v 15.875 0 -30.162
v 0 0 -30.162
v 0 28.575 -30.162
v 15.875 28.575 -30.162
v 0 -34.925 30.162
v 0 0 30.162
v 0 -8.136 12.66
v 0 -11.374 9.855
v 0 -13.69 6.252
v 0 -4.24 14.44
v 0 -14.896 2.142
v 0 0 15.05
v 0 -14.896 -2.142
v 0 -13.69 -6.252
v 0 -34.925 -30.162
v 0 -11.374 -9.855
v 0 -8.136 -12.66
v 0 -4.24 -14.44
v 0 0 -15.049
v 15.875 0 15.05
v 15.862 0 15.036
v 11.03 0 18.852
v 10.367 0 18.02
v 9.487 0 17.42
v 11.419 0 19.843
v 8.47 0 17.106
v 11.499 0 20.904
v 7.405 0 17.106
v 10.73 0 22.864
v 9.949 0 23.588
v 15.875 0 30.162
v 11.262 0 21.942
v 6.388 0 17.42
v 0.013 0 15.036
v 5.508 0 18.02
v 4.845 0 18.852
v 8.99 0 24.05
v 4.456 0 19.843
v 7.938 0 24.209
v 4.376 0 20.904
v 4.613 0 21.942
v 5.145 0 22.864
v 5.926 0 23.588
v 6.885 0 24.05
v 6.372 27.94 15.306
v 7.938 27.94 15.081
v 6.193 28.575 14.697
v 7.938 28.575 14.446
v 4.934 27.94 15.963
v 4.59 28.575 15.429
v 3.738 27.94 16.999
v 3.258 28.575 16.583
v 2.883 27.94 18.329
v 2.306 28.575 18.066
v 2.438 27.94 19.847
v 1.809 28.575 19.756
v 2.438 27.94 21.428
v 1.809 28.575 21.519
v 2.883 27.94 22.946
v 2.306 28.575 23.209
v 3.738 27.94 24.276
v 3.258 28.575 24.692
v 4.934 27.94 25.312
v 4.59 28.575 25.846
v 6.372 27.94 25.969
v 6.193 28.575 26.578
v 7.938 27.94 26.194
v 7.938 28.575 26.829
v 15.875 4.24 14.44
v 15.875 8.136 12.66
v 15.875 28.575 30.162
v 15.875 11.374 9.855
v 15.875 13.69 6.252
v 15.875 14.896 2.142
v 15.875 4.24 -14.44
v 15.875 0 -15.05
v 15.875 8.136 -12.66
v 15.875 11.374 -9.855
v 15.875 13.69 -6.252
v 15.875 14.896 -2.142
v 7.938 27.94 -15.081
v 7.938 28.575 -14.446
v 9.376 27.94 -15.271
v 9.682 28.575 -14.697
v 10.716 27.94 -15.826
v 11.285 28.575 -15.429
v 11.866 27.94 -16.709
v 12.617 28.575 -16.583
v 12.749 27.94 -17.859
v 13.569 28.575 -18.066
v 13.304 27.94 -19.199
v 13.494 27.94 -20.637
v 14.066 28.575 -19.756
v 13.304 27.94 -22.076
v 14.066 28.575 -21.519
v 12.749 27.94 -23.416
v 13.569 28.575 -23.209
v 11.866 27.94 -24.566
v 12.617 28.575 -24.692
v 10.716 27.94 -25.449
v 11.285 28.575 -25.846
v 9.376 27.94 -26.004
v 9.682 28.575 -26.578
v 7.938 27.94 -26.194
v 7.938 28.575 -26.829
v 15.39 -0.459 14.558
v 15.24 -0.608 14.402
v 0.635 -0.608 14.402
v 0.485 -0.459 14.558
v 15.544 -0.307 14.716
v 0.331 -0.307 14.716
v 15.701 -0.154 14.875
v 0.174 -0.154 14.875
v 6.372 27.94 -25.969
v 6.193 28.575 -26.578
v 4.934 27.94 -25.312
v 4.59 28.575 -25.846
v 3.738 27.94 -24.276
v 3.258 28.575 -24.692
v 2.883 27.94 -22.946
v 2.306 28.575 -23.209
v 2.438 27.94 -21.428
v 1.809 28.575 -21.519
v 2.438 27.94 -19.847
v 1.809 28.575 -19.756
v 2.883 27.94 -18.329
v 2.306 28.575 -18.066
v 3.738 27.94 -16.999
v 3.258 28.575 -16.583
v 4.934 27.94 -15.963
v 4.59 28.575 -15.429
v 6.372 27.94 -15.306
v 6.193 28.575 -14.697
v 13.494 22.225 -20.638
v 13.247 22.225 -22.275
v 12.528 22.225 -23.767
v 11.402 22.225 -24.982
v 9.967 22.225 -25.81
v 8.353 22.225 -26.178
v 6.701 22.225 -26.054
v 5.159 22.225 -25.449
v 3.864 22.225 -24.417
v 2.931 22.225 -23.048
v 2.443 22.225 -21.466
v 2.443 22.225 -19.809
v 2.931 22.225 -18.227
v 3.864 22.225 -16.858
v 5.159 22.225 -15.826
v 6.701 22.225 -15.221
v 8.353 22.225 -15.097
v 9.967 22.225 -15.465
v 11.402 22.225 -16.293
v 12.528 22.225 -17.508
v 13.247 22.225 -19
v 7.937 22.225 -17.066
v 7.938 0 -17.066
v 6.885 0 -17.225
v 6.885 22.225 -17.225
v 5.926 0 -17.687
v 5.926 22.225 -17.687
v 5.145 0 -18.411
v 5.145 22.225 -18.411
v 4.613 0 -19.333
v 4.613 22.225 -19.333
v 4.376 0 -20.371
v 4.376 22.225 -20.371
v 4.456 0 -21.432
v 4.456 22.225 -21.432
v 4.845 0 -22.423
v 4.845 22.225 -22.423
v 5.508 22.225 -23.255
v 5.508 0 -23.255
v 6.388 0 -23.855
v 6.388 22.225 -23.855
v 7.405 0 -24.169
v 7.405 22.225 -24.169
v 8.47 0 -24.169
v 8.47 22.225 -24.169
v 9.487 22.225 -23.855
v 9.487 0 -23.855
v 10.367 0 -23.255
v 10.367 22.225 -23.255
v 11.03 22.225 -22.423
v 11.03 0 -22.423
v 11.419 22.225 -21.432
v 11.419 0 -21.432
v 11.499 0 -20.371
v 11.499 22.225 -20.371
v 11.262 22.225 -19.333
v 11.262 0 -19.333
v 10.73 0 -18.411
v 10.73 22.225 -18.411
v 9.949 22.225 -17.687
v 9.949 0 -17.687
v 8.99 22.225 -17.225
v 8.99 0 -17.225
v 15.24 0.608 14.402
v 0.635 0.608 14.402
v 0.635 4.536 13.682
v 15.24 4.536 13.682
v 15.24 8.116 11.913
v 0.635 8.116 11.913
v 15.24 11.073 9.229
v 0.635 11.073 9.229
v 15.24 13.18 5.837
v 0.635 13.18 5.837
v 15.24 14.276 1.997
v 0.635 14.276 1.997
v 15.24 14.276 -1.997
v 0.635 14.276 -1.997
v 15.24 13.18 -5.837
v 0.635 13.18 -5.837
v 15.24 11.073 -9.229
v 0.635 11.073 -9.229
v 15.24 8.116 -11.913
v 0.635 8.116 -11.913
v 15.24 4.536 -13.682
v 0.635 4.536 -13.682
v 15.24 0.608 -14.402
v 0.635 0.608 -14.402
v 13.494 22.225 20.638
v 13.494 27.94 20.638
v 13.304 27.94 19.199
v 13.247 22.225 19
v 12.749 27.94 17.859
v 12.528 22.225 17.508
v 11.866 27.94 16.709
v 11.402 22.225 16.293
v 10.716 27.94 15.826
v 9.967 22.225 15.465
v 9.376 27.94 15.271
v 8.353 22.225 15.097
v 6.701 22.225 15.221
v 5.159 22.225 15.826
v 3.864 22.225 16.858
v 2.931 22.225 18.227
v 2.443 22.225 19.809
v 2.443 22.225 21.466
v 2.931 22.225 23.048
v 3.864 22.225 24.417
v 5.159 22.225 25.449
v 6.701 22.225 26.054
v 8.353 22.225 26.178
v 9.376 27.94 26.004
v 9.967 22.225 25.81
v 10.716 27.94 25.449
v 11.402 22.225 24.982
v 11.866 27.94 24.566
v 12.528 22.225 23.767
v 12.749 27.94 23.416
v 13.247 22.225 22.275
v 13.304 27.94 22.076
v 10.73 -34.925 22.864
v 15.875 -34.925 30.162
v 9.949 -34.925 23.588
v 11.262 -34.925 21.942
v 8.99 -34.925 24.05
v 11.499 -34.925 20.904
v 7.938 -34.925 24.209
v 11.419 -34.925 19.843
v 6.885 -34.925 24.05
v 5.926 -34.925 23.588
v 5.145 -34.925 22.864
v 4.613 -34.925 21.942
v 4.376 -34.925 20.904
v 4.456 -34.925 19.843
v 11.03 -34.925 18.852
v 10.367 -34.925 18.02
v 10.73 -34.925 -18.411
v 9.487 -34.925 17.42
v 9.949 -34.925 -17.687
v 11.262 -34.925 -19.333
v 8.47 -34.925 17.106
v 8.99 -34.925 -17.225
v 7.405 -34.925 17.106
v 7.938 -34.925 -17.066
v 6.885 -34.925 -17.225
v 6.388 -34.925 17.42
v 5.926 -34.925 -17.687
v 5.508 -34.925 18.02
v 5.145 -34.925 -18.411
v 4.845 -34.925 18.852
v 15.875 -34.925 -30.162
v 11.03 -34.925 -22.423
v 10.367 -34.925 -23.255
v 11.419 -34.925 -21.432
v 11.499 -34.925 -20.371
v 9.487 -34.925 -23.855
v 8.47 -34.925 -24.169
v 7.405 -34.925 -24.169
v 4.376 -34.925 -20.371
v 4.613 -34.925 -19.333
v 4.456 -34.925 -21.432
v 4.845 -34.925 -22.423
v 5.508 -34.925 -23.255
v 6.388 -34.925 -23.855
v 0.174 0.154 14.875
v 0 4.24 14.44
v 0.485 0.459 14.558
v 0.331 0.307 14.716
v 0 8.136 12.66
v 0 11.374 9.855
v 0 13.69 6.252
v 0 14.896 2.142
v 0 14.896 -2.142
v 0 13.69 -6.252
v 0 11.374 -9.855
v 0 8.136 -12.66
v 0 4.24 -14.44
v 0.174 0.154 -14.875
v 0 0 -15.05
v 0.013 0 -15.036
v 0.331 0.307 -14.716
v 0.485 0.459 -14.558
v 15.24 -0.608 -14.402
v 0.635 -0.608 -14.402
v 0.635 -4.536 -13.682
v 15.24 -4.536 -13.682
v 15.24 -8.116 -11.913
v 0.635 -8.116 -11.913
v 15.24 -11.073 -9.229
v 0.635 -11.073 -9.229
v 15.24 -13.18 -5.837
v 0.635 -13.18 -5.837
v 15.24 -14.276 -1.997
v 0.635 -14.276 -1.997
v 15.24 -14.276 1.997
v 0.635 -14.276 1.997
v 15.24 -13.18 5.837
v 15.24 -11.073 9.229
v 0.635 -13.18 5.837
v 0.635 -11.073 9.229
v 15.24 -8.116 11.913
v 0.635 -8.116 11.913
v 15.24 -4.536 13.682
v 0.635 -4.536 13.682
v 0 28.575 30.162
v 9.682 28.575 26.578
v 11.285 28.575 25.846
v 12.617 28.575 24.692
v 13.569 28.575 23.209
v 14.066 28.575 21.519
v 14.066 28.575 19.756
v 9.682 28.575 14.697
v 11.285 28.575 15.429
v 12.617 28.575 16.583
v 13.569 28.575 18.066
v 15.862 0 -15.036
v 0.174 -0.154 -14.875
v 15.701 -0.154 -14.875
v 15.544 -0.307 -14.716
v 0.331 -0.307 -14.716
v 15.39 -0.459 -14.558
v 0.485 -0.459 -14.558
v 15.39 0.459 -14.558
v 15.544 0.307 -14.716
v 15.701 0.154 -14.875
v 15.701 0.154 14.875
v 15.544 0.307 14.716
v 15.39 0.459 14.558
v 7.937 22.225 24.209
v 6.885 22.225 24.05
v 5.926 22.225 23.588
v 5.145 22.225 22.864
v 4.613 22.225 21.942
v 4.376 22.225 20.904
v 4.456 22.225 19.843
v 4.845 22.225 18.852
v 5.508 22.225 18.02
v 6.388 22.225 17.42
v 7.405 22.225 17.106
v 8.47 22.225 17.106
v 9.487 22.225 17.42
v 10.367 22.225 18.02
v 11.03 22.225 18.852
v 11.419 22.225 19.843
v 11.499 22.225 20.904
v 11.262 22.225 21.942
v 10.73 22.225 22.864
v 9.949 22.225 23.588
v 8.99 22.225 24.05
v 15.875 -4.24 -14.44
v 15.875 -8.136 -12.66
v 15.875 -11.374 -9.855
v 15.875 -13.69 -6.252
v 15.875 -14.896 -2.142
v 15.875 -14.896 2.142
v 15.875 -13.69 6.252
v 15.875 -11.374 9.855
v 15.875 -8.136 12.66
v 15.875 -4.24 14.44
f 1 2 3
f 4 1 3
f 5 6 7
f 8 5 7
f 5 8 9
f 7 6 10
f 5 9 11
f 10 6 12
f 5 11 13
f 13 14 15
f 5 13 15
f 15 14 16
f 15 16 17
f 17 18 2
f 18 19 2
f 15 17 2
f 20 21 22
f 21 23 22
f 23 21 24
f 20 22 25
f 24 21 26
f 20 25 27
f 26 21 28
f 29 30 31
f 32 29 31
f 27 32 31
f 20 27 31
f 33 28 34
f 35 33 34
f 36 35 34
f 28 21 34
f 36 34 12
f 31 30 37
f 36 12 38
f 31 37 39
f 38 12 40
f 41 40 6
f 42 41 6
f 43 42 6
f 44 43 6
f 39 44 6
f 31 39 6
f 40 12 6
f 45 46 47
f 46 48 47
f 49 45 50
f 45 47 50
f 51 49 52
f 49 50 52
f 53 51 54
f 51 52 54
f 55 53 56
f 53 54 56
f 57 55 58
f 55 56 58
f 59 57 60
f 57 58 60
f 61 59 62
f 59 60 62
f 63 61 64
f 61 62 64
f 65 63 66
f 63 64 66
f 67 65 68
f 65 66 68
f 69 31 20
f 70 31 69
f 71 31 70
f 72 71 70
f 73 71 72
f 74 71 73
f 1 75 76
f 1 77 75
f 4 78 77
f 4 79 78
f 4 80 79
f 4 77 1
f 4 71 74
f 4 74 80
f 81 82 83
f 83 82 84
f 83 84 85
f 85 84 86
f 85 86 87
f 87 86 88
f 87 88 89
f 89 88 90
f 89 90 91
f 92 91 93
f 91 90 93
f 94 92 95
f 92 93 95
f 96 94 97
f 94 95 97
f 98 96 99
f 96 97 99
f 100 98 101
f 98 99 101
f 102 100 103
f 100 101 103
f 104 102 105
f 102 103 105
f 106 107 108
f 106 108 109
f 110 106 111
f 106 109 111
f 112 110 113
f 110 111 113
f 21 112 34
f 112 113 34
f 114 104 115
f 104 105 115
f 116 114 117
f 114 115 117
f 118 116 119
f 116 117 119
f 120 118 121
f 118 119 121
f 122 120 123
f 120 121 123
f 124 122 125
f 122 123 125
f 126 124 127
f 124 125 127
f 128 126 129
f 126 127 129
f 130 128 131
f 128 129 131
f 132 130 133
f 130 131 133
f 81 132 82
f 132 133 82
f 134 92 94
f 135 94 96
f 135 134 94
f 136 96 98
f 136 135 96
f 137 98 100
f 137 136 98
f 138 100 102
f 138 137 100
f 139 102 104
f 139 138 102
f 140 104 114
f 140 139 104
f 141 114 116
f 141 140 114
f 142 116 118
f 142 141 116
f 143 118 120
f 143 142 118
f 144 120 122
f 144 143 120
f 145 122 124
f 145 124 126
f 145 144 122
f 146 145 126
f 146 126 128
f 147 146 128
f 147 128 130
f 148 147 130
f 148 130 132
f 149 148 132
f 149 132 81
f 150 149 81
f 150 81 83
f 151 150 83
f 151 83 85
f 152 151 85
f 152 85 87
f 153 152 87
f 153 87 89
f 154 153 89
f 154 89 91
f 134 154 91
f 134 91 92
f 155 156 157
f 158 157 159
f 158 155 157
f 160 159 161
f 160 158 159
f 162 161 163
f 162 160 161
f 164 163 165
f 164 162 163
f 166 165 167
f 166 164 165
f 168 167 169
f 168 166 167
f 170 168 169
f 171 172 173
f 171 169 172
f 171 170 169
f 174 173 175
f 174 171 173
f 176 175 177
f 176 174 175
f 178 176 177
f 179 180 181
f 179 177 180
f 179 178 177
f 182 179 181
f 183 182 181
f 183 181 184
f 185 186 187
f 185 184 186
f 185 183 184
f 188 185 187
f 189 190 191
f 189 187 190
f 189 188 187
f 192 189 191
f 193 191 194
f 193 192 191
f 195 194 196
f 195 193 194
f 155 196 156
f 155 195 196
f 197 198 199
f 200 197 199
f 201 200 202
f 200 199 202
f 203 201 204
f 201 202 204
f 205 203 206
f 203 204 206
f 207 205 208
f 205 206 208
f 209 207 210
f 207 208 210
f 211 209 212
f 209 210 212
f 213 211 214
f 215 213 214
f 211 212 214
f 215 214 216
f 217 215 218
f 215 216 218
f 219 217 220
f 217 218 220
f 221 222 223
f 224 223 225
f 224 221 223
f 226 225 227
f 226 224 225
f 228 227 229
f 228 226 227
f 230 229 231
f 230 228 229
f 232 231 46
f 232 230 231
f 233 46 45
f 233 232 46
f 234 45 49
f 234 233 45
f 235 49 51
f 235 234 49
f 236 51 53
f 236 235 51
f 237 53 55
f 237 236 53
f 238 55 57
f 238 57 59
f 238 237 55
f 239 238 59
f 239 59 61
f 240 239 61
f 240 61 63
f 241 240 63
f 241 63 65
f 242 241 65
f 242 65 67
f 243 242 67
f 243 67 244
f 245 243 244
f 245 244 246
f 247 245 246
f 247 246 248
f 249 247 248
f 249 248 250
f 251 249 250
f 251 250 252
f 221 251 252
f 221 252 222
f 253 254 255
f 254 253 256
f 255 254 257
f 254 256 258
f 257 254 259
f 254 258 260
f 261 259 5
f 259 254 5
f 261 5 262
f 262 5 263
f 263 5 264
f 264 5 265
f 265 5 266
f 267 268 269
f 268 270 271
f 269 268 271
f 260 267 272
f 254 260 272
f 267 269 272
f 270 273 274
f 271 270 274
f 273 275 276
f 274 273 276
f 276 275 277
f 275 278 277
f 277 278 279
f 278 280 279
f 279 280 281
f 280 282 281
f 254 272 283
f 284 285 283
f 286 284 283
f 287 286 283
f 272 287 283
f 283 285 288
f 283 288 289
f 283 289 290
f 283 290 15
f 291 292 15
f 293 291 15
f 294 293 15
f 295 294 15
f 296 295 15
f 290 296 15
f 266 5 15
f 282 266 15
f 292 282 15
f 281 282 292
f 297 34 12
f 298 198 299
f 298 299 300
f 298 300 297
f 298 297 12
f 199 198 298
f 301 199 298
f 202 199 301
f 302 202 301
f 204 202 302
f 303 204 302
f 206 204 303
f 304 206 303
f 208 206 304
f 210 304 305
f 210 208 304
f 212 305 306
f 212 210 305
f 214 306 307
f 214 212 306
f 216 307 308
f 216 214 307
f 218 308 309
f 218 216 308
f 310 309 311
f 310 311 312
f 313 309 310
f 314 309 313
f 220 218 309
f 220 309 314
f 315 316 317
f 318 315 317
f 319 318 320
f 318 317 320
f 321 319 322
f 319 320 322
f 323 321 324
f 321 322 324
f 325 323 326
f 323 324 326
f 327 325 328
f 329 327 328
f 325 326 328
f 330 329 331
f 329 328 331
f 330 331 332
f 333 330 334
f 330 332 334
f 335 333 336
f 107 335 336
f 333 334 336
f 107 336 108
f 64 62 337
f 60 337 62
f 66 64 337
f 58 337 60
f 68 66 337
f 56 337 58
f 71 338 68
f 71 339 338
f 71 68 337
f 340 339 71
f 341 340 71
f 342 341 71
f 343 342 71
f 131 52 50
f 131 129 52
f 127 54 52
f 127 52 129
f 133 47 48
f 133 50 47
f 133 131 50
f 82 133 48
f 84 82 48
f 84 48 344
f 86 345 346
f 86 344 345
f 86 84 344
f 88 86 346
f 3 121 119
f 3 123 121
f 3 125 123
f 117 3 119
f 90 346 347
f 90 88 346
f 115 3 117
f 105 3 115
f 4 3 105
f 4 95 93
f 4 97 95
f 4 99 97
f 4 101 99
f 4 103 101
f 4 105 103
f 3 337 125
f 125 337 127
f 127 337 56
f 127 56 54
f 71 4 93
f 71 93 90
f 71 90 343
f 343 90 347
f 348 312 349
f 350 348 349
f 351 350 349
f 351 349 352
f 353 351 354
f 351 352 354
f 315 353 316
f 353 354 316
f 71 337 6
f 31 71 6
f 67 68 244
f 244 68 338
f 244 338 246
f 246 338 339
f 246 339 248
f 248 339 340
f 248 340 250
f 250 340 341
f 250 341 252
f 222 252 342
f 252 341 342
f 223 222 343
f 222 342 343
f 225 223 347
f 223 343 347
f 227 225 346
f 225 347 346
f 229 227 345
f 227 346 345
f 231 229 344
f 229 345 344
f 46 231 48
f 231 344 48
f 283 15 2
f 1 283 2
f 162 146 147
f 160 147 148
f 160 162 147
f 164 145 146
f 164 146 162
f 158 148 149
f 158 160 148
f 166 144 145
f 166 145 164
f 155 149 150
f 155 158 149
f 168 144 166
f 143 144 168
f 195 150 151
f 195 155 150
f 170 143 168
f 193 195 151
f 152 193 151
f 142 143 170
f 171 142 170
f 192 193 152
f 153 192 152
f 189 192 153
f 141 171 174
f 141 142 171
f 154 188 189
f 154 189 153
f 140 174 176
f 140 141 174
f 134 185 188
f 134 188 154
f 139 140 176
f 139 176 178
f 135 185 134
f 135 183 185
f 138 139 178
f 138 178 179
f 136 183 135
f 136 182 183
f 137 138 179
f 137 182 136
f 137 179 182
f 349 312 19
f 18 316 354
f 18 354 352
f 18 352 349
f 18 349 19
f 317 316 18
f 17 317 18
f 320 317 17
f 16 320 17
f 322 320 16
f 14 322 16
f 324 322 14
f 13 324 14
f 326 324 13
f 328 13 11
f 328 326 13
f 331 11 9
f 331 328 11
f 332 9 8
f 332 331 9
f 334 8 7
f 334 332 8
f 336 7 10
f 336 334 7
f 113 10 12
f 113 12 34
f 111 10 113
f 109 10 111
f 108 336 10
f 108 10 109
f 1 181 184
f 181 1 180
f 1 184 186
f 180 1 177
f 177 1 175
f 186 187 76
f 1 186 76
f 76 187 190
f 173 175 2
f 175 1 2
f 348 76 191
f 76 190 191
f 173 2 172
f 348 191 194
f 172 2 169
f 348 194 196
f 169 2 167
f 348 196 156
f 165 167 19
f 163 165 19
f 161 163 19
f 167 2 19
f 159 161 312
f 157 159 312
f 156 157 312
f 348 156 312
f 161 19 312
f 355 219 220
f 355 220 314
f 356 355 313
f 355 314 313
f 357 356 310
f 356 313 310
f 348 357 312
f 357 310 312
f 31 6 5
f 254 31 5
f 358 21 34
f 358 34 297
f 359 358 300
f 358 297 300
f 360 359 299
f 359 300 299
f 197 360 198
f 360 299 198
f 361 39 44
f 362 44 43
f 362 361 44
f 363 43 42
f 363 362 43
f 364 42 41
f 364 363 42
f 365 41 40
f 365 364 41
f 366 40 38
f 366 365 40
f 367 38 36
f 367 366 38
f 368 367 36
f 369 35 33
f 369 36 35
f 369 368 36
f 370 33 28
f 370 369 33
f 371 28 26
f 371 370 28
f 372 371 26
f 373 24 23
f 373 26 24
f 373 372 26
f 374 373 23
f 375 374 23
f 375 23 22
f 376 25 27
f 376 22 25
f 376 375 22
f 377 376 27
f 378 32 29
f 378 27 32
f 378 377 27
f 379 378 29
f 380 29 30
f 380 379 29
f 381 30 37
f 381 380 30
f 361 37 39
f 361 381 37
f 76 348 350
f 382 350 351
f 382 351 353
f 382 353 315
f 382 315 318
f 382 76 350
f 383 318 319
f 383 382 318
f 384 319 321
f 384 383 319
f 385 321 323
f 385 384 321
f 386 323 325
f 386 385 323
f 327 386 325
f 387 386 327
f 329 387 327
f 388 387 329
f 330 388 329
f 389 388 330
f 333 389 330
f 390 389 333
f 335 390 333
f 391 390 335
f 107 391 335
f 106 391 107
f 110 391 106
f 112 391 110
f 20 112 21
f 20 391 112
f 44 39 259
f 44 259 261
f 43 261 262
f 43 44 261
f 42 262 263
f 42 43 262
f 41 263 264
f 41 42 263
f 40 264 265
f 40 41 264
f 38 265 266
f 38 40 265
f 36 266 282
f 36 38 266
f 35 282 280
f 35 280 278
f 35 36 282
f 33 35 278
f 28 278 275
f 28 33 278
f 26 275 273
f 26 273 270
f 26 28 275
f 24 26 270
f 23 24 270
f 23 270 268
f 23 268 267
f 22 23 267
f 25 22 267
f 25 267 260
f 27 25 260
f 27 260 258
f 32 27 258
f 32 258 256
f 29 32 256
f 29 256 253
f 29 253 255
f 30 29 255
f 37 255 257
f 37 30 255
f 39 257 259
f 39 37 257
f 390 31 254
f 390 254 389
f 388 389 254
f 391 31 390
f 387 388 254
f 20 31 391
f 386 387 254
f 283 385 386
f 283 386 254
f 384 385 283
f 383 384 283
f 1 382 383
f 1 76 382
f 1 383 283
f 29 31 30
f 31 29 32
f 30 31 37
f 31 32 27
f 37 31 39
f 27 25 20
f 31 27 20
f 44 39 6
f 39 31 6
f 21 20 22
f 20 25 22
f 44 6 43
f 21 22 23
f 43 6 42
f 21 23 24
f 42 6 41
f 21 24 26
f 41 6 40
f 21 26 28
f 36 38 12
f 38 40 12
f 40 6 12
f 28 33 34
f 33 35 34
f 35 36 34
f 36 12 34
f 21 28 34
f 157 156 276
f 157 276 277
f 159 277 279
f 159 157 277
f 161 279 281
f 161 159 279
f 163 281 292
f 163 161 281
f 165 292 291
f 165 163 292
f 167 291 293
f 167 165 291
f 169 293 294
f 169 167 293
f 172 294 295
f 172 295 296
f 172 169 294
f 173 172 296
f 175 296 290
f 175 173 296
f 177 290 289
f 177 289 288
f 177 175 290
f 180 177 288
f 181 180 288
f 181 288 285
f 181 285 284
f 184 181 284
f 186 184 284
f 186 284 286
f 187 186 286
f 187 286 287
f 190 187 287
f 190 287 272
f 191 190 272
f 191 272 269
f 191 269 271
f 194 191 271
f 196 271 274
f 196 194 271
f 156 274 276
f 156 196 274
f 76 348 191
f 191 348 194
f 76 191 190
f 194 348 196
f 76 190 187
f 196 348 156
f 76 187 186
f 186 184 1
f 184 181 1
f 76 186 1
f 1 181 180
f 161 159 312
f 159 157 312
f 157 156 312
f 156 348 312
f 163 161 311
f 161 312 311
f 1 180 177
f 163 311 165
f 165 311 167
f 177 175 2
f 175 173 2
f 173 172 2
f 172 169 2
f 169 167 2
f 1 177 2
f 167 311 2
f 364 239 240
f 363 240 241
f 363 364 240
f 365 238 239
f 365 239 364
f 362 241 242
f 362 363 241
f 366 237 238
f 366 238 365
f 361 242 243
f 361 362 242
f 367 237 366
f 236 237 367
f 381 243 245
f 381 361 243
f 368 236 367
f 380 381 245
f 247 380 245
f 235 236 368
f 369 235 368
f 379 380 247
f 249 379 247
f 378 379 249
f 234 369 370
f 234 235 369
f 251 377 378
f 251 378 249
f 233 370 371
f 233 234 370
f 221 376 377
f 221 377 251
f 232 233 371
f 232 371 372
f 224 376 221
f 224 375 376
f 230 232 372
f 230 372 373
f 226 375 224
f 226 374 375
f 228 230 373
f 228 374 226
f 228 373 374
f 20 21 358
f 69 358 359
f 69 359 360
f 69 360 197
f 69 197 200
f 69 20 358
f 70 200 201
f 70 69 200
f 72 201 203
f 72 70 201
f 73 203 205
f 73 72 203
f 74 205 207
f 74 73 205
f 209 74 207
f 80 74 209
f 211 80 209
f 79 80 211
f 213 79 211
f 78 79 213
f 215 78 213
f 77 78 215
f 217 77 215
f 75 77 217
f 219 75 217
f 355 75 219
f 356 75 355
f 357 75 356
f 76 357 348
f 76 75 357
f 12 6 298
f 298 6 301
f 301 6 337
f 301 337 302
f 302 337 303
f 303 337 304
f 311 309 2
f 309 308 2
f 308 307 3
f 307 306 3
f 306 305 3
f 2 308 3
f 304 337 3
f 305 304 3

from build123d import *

# Parameters (mm, degrees)
BOSS_EXTRUDE1_DEPTH                           = 15.875
BOSS_EXTRUDE2_DEPTH                           = 15.875
CBORE_FOR_1_4_SOCKET_HEAD_CAP_SCREW1_AT_COUNT = 2
CBORE_FOR_1_4_SOCKET_HEAD_CAP_SCREW1_AT_PITCH = 41.275
MOVE_FACE1_BY                                 = 0.127
MOVE_FACE1_2_BY                               = 0.127
MOVE_START                                    = 28.575
MOVE_FACE2_OUTLINE_W                          = 15.875
MOVE_FACE2_OUTLINE_H                          = 60.325
MOVE_FACE2_OUTLINE_R                          = 5.55625
MOVE_FACE2_DEPTH                              = 6.35
MOVE_START_2                                  = 22.225
MOVE_FACE2_2_OUTLINE_R                        = 5.55625
MOVE_FACE2_2_OUTLINE_R_2                      = 3.57124
MOVE_FACE2_2_DEPTH                            = 6.35


with BuildPart() as part:
    # Sketch1 → Boss-Extrude1 (new body)
    with BuildSketch(Plane(origin=(0, 0, 0), x_dir=(0, 0, -1), z_dir=(1, 0, 0))):
        with BuildLine():
            Line((30.1625, 0), (14.2875, 0))
            ThreePointArc((14.2875, 0), (0, -14.2875), (-14.2875, 0))
            Line((-14.2875, 0), (-30.1625, 0))
            Line((-30.1625, 0), (-30.1625, -34.925))
            Line((-30.1625, -34.925), (30.1625, -34.925))
            Line((30.1625, -34.925), (30.1625, 0))
        make_face()
    extrude(amount=BOSS_EXTRUDE1_DEPTH)


with BuildPart() as body_2:
    # Sketch1<3> → Boss-Extrude2 (new body)
    with BuildSketch(Plane(origin=(0, 0, 0), x_dir=(0, 0, -1), z_dir=(1, 0, 0))):
        with BuildLine():
            ThreePointArc((-14.2875, 0), (0, 14.2875), (14.2875, 0))
            Line((14.2875, 0), (30.1625, 0))
            Line((30.1625, 0), (30.1625, 34.925))
            Line((30.1625, 34.925), (-30.1625, 34.925))
            Line((-30.1625, 34.925), (-30.1625, 0))
            Line((-30.1625, 0), (-14.2875, 0))
        make_face()
    extrude(amount=BOSS_EXTRUDE2_DEPTH)


with BuildPart() as cbore_for_1_4_socket_head_cap_screw1_tool:
    # Sketch4 → CBORE for 1/4 Socket Head Cap Screw1 (revolve)
    with BuildSketch(Plane(origin=(7.9375, 34.925, 20.6375), x_dir=(0, 0, 1), z_dir=(1, 0, 0))):
        Polygon((0, 0), (0, 69.85), (3.57124, 69.85), (3.57124, 6.35), (5.55625, 6.35), (5.55625, 0.635), (6.19125, 0), align=None)
    cbore_for_1_4_socket_head_cap_screw1 = revolve(axis=Axis((7.9375, 41.275, 20.6375), (0, -1, 0)))


with BuildPart() as part_1:
    add(part.part)

    # CBORE for 1/4 Socket Head Cap Screw1: cut by cbore_for_1_4_socket_head_cap_screw1_tool
    add(cbore_for_1_4_socket_head_cap_screw1_tool.part, mode=Mode.SUBTRACT)


with BuildPart() as body_2_1:
    add(body_2.part)

    # CBORE for 1/4 Socket Head Cap Screw1: cut by cbore_for_1_4_socket_head_cap_screw1_tool
    add(cbore_for_1_4_socket_head_cap_screw1_tool.part, mode=Mode.SUBTRACT)


with BuildPart() as cbore_for_1_4_socket_head_cap_screw1_at_tool:
    # CBORE for 1/4 Socket Head Cap Screw1 at: CBORE for 1/4 Socket Head Cap Screw1 ×2
    with Locations(*[(0, 0, -i * CBORE_FOR_1_4_SOCKET_HEAD_CAP_SCREW1_AT_PITCH) for i in range(1, CBORE_FOR_1_4_SOCKET_HEAD_CAP_SCREW1_AT_COUNT)]):
        add(cbore_for_1_4_socket_head_cap_screw1)


with BuildPart() as part_2:
    add(part_1.part)

    # CBORE for 1/4 Socket Head Cap Screw1 at: cut by cbore_for_1_4_socket_head_cap_screw1_at_tool
    add(cbore_for_1_4_socket_head_cap_screw1_at_tool.part, mode=Mode.SUBTRACT)

    # Move Face1 2: a curved face moved inward by 0.127
    add(Solid.thicken(part_2.faces().sort_by_distance((7.9375, -14.2875, 0))[0], -MOVE_FACE1_2_BY), mode=Mode.SUBTRACT)

    # Chamfer2
    # the kernel refuses this chamfer: 0.635 mm, written as the material it takes off along each edge
    with BuildSketch(Plane(origin=(0, 0, 0), x_dir=(0, 0.1132288377802066, -0.9935689358544497), z_dir=(0, 0.9935689358544497, 0.1132288377802066))) as chamfer2_piece_1:
        with BuildLine():
            Line((15.067460512, 0.017960512), (14.396539488, -0.652960512))
            Line((14.396539488, -0.652960512), (14.383839488, -0.652960512))
            ThreePointArc((14.383839488, -0.652960512), (14.4018, -0.326480256), (14.4018, 0))
            Line((14.4018, 0), (14.4145, 0.0127))
            ThreePointArc((14.4145, 0.0127), (14.740980256, 0.0127), (15.067460512, 0.030660512))
            Line((15.067460512, 0.030660512), (15.067460512, 0.017960512))
        make_face()
    revolve(axis=Axis((0, 0, 0), (-1, 0, 0)), revolution_arc=193.002955297, mode=Mode.SUBTRACT)
    with BuildSketch(Plane(origin=(-1.600435701, 0, -14.4145), x_dir=(0, 0, -1), z_dir=(1, 0, 0))) as chamfer2_piece_2:
        with BuildLine():
            Line((0.639932919, 0.017577515), (-0.031172593, -0.625784266))
            Line((-0.031172593, -0.625784266), (-0.043861283, -0.625248401))
            ThreePointArc((-0.043861283, -0.625248401), (-0.016099091, -0.31288099), (-0.0127, 0))
            Line((-0.0127, 0), (0, 0.0127))
            ThreePointArc((0, 0.0127), (0.319966459, 0.0127), (0.639932919, 0.030277515))
            Line((0.639932919, 0.030277515), (0.639932919, 0.017577515))
        make_face()
    extrude(amount=19.075871403, mode=Mode.SUBTRACT)
    with BuildSketch(Plane(origin=(-1.600435701, 0, 14.4145), x_dir=(0, -0.999777333387341, -0.021101745067597762), z_dir=(1, 0, 0))) as chamfer2_piece_3:
        with BuildLine():
            Line((0.626302721, 0.017960512), (-0.031077302, -0.639419511))
            Line((-0.031077302, -0.639419511), (-0.043774474, -0.639151519))
            ThreePointArc((-0.043774474, -0.639151519), (-0.019449023, -0.319627221), (-0.012697172, 0.000267992))
            Line((-0.012697172, 0.000267992), (0.000267992, 0.012697172))
            ThreePointArc((0.000267992, 0.012697172), (0.313151041, 0.009493172), (0.626034729, 0.030657684))
            Line((0.626034729, 0.030657684), (0.626302721, 0.017960512))
        make_face()
    extrude(amount=19.075871403, mode=Mode.SUBTRACT)
    with BuildSketch(Plane(origin=(15.875, 0, 0), x_dir=(0, 0.11322883778020662, -0.9935689358544497), z_dir=(0, 0.9935689358544497, 0.11322883778020662))) as chamfer2_piece_4:
        with BuildLine():
            Line((14.396539488, 0.652960512), (15.067460512, -0.017960512))
            Line((15.067460512, -0.017960512), (15.067460512, -0.030660512))
            ThreePointArc((15.067460512, -0.030660512), (14.740980256, -0.0127), (14.4145, -0.0127))
            Line((14.4145, -0.0127), (14.4018, 0))
            ThreePointArc((14.4018, 0), (14.4018, 0.326480256), (14.383839488, 0.652960512))
            Line((14.383839488, 0.652960512), (14.396539488, 0.652960512))
        make_face()
    revolve(axis=Axis((15.875, 0, 0), (-1, 0, 0)), revolution_arc=193.002955297, mode=Mode.SUBTRACT)


with BuildPart() as body_2_2:
    add(body_2_1.part)

    # CBORE for 1/4 Socket Head Cap Screw1 at: cut by cbore_for_1_4_socket_head_cap_screw1_at_tool
    add(cbore_for_1_4_socket_head_cap_screw1_at_tool.part, mode=Mode.SUBTRACT)

    # Move Face1: a curved face moved inward by 0.127
    add(Solid.thicken(body_2_2.faces().sort_by_distance((7.9375, 14.2875, 0))[0], -MOVE_FACE1_BY), mode=Mode.SUBTRACT)

    # Move Face2: read off the stored shape, not the designer's step
    # Move Face2 outline → Move Face2 (cut)
    with BuildSketch(Plane(origin=(0, 0, 0), x_dir=(1, 0, 0), z_dir=(0, 1, 0)).offset(MOVE_START)):
        with Locations((7.9375, 0)):
            Rectangle(MOVE_FACE2_OUTLINE_W, MOVE_FACE2_OUTLINE_H)
        with Locations((7.9375, -20.6375)):
            Circle(MOVE_FACE2_OUTLINE_R, mode=Mode.SUBTRACT)
        with Locations((7.9375, 20.6375)):
            Circle(MOVE_FACE2_OUTLINE_R, mode=Mode.SUBTRACT)
    extrude(amount=MOVE_FACE2_DEPTH, mode=Mode.SUBTRACT)

    # Move Face2 2 outline → Move Face2 2 (cut)
    # profile 1 of 2: a face of its own
    with BuildSketch(Plane(origin=(0, 0, 0), x_dir=(1, 0, 0), z_dir=(0, 1, 0)).offset(MOVE_START_2)):
        with Locations((7.9375, 20.6375)):
            Circle(MOVE_FACE2_2_OUTLINE_R)
        with Locations((7.9375, 20.6375)):
            Circle(MOVE_FACE2_2_OUTLINE_R_2, mode=Mode.SUBTRACT)
    # profile 2 of 2: a face of its own
    with BuildSketch(Plane(origin=(0, 0, 0), x_dir=(1, 0, 0), z_dir=(0, 1, 0)).offset(MOVE_START_2)):
        with Locations((7.9375, -20.6375)):
            Circle(MOVE_FACE2_2_OUTLINE_R)
        with Locations((7.9375, -20.6375)):
            Circle(MOVE_FACE2_2_OUTLINE_R_2, mode=Mode.SUBTRACT)
    extrude(amount=MOVE_FACE2_2_DEPTH, mode=Mode.SUBTRACT)

    # Move Face2 3: loft between two sections, ruled curve by curve
    move_face2_3_from = [
        Edge.make_three_point_arc((7.9375, 27.94, -15.08125), (13.49375, 27.94, -20.6375), (7.9375, 27.94, -26.19375)),
        Edge.make_three_point_arc((7.9375, 27.94, -26.19375), (2.38125, 27.94, -20.6375), (7.9375, 27.94, -15.08125)),
    ]
    move_face2_3_to = [
        Edge.make_three_point_arc((7.9375, 28.575, -14.44625), (14.12875, 28.575, -20.6375), (7.9375, 28.575, -26.82875)),
        Edge.make_three_point_arc((7.9375, 28.575, -26.82875), (1.74625, 28.575, -20.6375), (7.9375, 28.575, -14.44625)),
    ]
    move_face2_3 = Solid(Shell([*[Face.make_surface_from_curves(move_face2_3_from[k], move_face2_3_to[k]) for k in range(2)], Face(Wire(move_face2_3_from)), Face(Wire(move_face2_3_to))]))
    add(move_face2_3, mode=Mode.SUBTRACT)

    # Move Face2 4: loft between two sections, ruled curve by curve
    move_face2_4_from = [
        Edge.make_three_point_arc((7.9375, 27.94, 26.19375), (13.49375, 27.94, 20.6375), (7.9375, 27.94, 15.08125)),
        Edge.make_three_point_arc((7.9375, 27.94, 15.08125), (2.38125, 27.94, 20.6375), (7.9375, 27.94, 26.19375)),
    ]
    move_face2_4_to = [
        Edge.make_three_point_arc((7.9375, 28.575, 26.82875), (14.12875, 28.575, 20.6375), (7.9375, 28.575, 14.44625)),
        Edge.make_three_point_arc((7.9375, 28.575, 14.44625), (1.74625, 28.575, 20.6375), (7.9375, 28.575, 26.82875)),
    ]
    move_face2_4 = Solid(Shell([*[Face.make_surface_from_curves(move_face2_4_from[k], move_face2_4_to[k]) for k in range(2)], Face(Wire(move_face2_4_from)), Face(Wire(move_face2_4_to))]))
    add(move_face2_4, mode=Mode.SUBTRACT)

    # Chamfer1
    # the kernel refuses this chamfer: 0.635 mm, written as the material it takes off along each edge
    with BuildSketch(Plane(origin=(0, 0, 0), x_dir=(0, -0.11322883778020673, 0.9935689358544497), z_dir=(0, -0.9935689358544497, -0.11322883778020673))) as chamfer1_piece_1:
        with BuildLine():
            Line((15.067460512, 0.017960512), (14.396539488, -0.652960512))
            Line((14.396539488, -0.652960512), (14.383839488, -0.652960512))
            ThreePointArc((14.383839488, -0.652960512), (14.4018, -0.326480256), (14.4018, 0))
            Line((14.4018, 0), (14.4145, 0.0127))
            ThreePointArc((14.4145, 0.0127), (14.740980256, 0.0127), (15.067460512, 0.030660512))
            Line((15.067460512, 0.030660512), (15.067460512, 0.017960512))
        make_face()
    revolve(axis=Axis((0, 0, 0), (-1, 0, 0)), revolution_arc=193.002955297, mode=Mode.SUBTRACT)
    with BuildSketch(Plane(origin=(-1.600435701, 0, 14.4145), x_dir=(0, 0, 1), z_dir=(1, 0, 0))) as chamfer1_piece_2:
        with BuildLine():
            Line((0.639932919, 0.017577515), (-0.031172593, -0.625784266))
            Line((-0.031172593, -0.625784266), (-0.043861283, -0.625248401))
            ThreePointArc((-0.043861283, -0.625248401), (-0.016099091, -0.31288099), (-0.0127, 0))
            Line((-0.0127, 0), (0, 0.0127))
            ThreePointArc((0, 0.0127), (0.319966459, 0.0127), (0.639932919, 0.030277515))
            Line((0.639932919, 0.030277515), (0.639932919, 0.017577515))
        make_face()
    extrude(amount=19.075871403, mode=Mode.SUBTRACT)
    with BuildSketch(Plane(origin=(-1.600435701, 0, -14.4145), x_dir=(0, 0.999777333387341, 0.021101745067597762), z_dir=(1, 0, 0))) as chamfer1_piece_3:
        with BuildLine():
            Line((0.626302721, 0.017960512), (-0.031077302, -0.639419511))
            Line((-0.031077302, -0.639419511), (-0.043774474, -0.639151519))
            ThreePointArc((-0.043774474, -0.639151519), (-0.019449023, -0.319627221), (-0.012697172, 0.000267992))
            Line((-0.012697172, 0.000267992), (0.000267992, 0.012697172))
            ThreePointArc((0.000267992, 0.012697172), (0.313151041, 0.009493172), (0.626034729, 0.030657684))
            Line((0.626034729, 0.030657684), (0.626302721, 0.017960512))
        make_face()
    extrude(amount=19.075871403, mode=Mode.SUBTRACT)
    with BuildSketch(Plane(origin=(15.875, 0, 0), x_dir=(0, -0.11322883778020675, 0.9935689358544497), z_dir=(0, -0.9935689358544497, -0.11322883778020675))) as chamfer1_piece_4:
        with BuildLine():
            Line((14.396539488, 0.652960512), (15.067460512, -0.017960512))
            Line((15.067460512, -0.017960512), (15.067460512, -0.030660512))
            ThreePointArc((15.067460512, -0.030660512), (14.740980256, -0.0127), (14.4145, -0.0127))
            Line((14.4145, -0.0127), (14.4018, 0))
            ThreePointArc((14.4018, 0), (14.4018, 0.326480256), (14.383839488, 0.652960512))
            Line((14.383839488, 0.652960512), (14.396539488, 0.652960512))
        make_face()
    revolve(axis=Axis((15.875, 0, 0), (-1, 0, 0)), revolution_arc=193.002955297, mode=Mode.SUBTRACT)


solid = Compound([part_2.part, body_2_2.part])
